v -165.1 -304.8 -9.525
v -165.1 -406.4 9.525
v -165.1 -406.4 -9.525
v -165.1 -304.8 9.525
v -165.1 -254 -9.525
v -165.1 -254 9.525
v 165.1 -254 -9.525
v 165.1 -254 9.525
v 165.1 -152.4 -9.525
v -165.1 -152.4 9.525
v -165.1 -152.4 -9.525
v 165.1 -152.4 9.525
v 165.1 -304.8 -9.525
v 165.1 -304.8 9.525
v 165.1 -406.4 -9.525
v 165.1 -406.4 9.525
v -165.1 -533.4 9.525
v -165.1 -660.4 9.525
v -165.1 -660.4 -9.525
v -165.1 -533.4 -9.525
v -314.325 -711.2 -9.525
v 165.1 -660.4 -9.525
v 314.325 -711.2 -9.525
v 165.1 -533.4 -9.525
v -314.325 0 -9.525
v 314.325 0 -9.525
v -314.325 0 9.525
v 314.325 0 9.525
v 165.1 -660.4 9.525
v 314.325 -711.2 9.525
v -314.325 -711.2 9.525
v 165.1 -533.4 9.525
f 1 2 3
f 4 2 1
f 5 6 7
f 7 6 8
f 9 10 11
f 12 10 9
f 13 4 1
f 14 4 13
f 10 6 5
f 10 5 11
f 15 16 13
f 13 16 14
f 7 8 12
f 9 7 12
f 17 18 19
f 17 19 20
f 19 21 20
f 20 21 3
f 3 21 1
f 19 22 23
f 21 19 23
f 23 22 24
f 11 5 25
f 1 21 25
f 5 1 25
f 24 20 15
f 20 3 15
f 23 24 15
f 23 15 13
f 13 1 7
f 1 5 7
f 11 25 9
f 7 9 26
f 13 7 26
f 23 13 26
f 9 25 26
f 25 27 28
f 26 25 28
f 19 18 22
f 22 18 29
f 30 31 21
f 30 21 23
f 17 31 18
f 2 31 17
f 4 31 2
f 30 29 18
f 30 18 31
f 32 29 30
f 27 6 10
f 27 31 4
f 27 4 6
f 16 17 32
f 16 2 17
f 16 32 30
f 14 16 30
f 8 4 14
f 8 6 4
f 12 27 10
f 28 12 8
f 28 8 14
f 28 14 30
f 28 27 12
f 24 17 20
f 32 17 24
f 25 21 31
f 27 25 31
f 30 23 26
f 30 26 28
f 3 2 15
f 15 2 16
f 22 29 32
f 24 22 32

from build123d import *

# Parameters (mm, degrees)
F0_W     = 628.65
F0_H     = 19.05
F1_DEPTH = 711.2
F2_W     = 330.2
F2_H     = 101.6
F2_H_2   = 127
F3_DEPTH = 25.4


with BuildPart() as f1:
    # F0 (on Front) → F1 (new body)
    with BuildSketch(Plane.XZ):
        Rectangle(F0_W, F0_H)
    extrude(amount=F1_DEPTH)

    # F2 (on face) → F3 (cut)
    with BuildSketch(Plane.XY.offset(9.525)):
        with Locations((0, -203.2)):
            Rectangle(F2_W, F2_H)
        with Locations((0, -355.6)):
            Rectangle(F2_W, F2_H)
        with Locations((0, -596.9)):
            Rectangle(F2_W, F2_H_2)
    extrude(amount=-F3_DEPTH, mode=Mode.SUBTRACT)


solid = f1.part
